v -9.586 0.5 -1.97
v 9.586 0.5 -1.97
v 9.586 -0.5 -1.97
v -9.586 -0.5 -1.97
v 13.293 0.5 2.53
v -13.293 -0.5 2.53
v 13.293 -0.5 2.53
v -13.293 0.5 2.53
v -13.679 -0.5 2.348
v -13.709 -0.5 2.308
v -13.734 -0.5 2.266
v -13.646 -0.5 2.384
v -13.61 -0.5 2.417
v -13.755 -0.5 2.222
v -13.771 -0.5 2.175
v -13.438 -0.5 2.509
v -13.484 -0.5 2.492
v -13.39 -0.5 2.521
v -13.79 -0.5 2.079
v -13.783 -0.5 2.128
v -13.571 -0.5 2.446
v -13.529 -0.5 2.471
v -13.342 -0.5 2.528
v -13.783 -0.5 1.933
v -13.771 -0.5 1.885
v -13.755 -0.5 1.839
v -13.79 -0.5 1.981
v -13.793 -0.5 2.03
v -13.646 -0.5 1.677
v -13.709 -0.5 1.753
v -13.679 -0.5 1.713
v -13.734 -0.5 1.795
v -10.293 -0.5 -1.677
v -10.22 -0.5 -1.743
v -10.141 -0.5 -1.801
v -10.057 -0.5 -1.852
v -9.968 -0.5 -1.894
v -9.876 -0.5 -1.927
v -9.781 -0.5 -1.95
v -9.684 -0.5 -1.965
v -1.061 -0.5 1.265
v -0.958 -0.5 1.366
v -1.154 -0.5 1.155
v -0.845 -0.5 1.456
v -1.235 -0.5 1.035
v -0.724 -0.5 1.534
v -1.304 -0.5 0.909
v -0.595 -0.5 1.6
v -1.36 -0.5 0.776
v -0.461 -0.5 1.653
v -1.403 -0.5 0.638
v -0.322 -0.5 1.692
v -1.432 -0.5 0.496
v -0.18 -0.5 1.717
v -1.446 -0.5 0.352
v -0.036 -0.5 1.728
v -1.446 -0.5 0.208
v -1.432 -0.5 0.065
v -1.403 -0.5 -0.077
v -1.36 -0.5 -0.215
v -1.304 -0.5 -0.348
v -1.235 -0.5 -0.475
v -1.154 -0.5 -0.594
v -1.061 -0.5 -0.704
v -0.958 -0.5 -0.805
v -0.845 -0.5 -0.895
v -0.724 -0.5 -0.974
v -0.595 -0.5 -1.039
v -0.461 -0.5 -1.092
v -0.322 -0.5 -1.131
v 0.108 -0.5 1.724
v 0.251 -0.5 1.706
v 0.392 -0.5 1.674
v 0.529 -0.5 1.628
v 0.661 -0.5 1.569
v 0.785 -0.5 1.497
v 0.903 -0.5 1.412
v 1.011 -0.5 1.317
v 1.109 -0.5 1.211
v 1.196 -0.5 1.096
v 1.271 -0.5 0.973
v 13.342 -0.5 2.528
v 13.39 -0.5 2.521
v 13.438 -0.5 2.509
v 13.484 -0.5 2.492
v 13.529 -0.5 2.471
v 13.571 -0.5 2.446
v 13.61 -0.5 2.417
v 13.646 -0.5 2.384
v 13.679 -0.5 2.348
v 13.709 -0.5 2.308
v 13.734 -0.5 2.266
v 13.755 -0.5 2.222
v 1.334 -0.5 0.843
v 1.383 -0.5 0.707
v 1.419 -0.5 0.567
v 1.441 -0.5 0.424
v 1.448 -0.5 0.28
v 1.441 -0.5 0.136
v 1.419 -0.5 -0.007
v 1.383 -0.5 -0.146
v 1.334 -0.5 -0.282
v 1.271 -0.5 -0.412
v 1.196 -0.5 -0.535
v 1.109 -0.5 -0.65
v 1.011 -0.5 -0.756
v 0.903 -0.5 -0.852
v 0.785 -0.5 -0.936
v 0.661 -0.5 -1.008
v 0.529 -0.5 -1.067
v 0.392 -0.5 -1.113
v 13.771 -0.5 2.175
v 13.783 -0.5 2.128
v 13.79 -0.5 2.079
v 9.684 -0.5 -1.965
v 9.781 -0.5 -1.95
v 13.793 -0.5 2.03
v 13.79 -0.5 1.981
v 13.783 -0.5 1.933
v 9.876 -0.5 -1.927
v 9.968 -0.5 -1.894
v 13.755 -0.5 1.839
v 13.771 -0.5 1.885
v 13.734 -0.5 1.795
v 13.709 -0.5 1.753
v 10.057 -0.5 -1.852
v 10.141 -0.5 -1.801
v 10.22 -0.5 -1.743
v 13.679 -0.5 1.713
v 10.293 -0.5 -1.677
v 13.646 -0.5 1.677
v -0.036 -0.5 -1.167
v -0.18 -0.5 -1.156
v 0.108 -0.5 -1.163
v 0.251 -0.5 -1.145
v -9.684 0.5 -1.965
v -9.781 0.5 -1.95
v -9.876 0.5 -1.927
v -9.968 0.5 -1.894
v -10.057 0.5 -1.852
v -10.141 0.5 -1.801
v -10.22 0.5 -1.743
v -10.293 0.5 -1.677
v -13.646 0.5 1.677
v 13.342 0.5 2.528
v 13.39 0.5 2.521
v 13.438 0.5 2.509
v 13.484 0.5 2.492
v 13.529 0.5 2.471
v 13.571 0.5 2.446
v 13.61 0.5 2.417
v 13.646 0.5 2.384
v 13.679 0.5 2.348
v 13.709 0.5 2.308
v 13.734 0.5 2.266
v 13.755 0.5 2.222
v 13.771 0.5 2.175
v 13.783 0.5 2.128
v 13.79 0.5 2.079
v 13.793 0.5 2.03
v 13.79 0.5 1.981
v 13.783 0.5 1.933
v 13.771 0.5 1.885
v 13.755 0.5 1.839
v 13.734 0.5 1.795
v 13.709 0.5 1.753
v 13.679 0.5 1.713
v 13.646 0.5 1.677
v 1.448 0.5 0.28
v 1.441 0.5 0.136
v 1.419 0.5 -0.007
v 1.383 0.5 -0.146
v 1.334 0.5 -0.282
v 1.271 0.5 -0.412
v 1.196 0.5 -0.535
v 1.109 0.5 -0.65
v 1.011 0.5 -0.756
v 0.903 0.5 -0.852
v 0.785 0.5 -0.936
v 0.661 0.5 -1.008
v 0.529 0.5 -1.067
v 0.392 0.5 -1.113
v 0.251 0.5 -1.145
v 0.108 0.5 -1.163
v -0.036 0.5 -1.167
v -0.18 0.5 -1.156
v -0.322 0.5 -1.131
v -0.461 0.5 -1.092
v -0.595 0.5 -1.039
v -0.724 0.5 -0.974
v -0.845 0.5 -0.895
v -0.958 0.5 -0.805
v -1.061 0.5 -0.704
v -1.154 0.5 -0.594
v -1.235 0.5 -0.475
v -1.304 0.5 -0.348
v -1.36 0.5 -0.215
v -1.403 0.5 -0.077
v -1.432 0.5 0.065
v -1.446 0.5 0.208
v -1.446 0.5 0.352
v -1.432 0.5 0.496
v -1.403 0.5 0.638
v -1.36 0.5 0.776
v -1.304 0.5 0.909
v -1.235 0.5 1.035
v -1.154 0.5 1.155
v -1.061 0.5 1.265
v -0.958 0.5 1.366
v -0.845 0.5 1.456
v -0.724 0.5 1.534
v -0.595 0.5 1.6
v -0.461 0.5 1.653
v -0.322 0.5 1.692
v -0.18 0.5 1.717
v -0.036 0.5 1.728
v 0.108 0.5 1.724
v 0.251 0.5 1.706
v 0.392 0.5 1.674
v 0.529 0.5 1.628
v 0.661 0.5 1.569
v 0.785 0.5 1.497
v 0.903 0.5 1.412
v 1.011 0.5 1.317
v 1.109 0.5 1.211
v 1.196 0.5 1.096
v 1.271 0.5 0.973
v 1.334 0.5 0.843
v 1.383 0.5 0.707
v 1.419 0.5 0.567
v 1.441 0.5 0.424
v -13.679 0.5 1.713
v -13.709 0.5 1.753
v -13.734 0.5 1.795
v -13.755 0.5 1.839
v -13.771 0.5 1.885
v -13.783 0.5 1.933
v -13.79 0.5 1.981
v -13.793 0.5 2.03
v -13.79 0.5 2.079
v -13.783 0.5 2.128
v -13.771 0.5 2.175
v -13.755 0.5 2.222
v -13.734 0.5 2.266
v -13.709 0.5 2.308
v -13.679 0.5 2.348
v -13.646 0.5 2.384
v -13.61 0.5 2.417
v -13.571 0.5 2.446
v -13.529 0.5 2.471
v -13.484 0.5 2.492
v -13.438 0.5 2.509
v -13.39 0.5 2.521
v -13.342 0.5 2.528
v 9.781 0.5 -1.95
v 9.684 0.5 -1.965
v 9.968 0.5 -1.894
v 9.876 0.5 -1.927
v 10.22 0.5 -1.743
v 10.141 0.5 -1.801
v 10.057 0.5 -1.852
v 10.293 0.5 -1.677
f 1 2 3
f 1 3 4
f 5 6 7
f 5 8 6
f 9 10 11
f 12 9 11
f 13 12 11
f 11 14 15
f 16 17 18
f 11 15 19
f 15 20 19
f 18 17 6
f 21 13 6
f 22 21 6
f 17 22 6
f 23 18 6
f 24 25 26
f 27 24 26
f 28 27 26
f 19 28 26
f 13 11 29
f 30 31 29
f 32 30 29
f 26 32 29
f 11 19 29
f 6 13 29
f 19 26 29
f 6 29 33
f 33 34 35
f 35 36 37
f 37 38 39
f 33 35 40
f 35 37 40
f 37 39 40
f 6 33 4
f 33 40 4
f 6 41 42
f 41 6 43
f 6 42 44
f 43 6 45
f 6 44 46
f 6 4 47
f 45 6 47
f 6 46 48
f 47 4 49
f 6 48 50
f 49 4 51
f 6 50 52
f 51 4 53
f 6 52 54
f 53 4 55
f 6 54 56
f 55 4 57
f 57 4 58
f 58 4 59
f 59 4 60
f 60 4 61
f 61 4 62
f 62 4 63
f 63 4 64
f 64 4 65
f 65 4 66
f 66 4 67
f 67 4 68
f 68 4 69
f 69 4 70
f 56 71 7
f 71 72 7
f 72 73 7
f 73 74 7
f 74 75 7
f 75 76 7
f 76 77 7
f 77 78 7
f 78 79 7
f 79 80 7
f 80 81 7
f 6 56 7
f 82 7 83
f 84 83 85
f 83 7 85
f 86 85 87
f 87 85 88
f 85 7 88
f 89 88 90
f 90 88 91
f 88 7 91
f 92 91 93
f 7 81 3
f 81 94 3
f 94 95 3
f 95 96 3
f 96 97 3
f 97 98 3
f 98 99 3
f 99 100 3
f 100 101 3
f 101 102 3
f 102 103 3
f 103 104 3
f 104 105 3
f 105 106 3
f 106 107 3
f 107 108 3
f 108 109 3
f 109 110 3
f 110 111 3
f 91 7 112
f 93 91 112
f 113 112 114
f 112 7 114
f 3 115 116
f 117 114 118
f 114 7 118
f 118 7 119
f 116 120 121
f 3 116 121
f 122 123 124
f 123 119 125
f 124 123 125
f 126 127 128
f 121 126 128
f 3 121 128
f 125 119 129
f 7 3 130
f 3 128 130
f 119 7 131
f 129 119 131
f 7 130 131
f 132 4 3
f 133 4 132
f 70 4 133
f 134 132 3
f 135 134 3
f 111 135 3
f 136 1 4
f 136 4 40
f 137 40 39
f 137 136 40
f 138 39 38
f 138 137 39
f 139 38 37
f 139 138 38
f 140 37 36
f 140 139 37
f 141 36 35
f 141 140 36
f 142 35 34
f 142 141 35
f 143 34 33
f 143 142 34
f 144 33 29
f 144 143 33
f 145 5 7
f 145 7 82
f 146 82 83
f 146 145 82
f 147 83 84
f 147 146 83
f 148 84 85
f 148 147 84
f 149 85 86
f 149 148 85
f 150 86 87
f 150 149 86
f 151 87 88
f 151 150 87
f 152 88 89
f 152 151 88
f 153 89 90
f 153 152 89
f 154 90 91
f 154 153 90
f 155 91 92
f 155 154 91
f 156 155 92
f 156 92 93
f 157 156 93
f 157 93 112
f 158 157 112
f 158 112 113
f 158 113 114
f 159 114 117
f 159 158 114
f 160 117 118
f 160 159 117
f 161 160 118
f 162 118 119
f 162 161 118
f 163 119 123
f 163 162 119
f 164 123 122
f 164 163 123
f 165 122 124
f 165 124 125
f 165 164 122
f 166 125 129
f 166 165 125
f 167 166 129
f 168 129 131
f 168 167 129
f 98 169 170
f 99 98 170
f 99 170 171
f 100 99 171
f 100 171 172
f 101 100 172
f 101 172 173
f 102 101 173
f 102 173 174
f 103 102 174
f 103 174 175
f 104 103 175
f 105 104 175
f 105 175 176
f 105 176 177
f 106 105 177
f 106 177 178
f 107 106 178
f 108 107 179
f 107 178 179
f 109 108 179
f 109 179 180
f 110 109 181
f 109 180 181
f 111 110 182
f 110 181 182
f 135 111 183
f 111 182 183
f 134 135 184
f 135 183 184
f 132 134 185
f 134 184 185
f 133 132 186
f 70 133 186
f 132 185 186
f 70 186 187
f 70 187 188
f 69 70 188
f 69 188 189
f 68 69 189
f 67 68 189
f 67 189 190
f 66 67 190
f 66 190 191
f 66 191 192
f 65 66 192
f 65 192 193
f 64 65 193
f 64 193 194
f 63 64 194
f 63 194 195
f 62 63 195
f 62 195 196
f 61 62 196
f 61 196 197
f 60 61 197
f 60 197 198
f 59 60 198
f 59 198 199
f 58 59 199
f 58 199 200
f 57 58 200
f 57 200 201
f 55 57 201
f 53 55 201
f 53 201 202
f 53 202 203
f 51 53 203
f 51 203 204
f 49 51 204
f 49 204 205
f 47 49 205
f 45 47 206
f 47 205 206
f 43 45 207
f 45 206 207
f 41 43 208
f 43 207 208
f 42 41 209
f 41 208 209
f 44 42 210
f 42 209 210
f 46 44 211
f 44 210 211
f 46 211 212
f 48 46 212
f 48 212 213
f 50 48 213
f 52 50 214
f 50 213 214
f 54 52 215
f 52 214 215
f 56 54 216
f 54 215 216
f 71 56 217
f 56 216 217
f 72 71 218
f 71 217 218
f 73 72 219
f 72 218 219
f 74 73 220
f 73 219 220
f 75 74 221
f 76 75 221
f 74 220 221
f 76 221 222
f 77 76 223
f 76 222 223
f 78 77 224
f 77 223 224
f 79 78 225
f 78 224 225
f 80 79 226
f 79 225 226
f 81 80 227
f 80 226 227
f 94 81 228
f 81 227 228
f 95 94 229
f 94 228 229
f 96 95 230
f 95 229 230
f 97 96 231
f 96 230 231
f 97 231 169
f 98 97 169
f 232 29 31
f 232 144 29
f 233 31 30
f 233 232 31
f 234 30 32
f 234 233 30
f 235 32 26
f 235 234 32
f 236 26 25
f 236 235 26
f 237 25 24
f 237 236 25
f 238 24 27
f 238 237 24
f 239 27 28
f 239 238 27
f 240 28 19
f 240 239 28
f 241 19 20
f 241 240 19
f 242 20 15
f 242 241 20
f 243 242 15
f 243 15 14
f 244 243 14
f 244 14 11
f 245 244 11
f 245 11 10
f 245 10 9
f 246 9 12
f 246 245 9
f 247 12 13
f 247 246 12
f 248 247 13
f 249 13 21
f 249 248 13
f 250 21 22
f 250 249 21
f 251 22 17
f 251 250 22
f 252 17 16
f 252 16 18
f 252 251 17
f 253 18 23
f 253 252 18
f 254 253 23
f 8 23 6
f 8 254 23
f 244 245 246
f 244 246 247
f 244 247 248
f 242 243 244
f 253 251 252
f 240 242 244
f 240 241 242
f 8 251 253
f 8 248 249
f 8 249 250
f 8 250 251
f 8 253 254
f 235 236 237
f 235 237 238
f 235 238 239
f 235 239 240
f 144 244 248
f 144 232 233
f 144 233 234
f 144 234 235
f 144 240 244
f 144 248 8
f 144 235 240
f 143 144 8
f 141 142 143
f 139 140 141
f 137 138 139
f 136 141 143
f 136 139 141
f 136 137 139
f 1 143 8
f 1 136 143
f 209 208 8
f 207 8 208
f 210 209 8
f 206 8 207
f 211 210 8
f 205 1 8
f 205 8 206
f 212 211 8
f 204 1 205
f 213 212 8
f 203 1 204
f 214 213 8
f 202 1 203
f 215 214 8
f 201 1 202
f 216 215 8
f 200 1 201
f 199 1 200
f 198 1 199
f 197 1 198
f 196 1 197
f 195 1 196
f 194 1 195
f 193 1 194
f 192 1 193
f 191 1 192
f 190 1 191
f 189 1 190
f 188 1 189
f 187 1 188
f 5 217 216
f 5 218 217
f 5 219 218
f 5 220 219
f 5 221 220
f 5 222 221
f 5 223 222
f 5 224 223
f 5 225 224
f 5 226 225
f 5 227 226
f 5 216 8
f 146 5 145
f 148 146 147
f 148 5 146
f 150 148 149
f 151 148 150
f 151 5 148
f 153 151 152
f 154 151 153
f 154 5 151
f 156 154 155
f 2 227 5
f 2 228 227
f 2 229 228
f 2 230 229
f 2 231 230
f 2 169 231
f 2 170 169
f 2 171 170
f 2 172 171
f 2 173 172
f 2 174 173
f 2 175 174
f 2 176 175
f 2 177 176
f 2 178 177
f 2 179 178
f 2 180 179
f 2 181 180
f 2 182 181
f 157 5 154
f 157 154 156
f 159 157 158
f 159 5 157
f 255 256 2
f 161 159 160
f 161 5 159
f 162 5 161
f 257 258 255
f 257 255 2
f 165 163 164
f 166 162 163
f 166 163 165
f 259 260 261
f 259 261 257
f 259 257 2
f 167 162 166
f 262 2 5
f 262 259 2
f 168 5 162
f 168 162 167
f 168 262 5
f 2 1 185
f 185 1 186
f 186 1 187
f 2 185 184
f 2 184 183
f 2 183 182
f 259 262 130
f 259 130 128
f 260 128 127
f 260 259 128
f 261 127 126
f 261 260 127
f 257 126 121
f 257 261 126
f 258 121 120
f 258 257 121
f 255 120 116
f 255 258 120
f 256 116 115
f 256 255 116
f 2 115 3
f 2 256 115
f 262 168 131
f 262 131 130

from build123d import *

# Parameters (mm, degrees)
BOSS_EXTRUDE1_DEPTH = 0.5
CUT_EXTRUDE1_REACH  = 3
SKETCH2_R           = 1.4478


with BuildPart() as part:
    # Sketch1 → Boss-Extrude1 (new body, symmetric)
    with BuildSketch(Plane(origin=(0, 0, 0), x_dir=(1, 0, 0), z_dir=(0, 1, 0))):
        with BuildLine():
            Line((-13.292893219, -2.530330086), (13.292893219, -2.530330086))
            ThreePointArc((13.292893219, -2.530330086), (13.754832985, -2.221671802), (13.646446609, -1.676776695))
            Line((13.646446609, -1.676776695), (10.292893219, 1.676776695))
            ThreePointArc((10.292893219, 1.676776695), (9.96846987, 1.893549447), (9.585786438, 1.969669914))
            Line((9.585786438, 1.969669914), (-9.585786438, 1.969669914))
            ThreePointArc((-9.585786438, 1.969669914), (-9.96846987, 1.893549447), (-10.292893219, 1.676776695))
            Line((-10.292893219, 1.676776695), (-13.646446609, -1.676776695))
            ThreePointArc((-13.646446609, -1.676776695), (-13.754832985, -2.221671802), (-13.292893219, -2.530330086))
        make_face()
    extrude(amount=BOSS_EXTRUDE1_DEPTH, both=True)

    # Sketch2 → Cut-Extrude1 (cut, up to next)
    with BuildSketch(Plane(origin=(0, 0.5, 0), x_dir=(1, 0, 0), z_dir=(0, 1, 0)), mode=Mode.PRIVATE) as cut_extrude1_sk1:
        with Locations((0, -0.280330086)):
            Circle(SKETCH2_R)
    cut_extrude1_tool1 = extrude(cut_extrude1_sk1.sketch, amount=-CUT_EXTRUDE1_REACH, mode=Mode.PRIVATE) & part.part
    add(cut_extrude1_tool1.solids().sort_by_distance((0, 0.5, 0.28033))[0], mode=Mode.SUBTRACT)


solid = part.part
